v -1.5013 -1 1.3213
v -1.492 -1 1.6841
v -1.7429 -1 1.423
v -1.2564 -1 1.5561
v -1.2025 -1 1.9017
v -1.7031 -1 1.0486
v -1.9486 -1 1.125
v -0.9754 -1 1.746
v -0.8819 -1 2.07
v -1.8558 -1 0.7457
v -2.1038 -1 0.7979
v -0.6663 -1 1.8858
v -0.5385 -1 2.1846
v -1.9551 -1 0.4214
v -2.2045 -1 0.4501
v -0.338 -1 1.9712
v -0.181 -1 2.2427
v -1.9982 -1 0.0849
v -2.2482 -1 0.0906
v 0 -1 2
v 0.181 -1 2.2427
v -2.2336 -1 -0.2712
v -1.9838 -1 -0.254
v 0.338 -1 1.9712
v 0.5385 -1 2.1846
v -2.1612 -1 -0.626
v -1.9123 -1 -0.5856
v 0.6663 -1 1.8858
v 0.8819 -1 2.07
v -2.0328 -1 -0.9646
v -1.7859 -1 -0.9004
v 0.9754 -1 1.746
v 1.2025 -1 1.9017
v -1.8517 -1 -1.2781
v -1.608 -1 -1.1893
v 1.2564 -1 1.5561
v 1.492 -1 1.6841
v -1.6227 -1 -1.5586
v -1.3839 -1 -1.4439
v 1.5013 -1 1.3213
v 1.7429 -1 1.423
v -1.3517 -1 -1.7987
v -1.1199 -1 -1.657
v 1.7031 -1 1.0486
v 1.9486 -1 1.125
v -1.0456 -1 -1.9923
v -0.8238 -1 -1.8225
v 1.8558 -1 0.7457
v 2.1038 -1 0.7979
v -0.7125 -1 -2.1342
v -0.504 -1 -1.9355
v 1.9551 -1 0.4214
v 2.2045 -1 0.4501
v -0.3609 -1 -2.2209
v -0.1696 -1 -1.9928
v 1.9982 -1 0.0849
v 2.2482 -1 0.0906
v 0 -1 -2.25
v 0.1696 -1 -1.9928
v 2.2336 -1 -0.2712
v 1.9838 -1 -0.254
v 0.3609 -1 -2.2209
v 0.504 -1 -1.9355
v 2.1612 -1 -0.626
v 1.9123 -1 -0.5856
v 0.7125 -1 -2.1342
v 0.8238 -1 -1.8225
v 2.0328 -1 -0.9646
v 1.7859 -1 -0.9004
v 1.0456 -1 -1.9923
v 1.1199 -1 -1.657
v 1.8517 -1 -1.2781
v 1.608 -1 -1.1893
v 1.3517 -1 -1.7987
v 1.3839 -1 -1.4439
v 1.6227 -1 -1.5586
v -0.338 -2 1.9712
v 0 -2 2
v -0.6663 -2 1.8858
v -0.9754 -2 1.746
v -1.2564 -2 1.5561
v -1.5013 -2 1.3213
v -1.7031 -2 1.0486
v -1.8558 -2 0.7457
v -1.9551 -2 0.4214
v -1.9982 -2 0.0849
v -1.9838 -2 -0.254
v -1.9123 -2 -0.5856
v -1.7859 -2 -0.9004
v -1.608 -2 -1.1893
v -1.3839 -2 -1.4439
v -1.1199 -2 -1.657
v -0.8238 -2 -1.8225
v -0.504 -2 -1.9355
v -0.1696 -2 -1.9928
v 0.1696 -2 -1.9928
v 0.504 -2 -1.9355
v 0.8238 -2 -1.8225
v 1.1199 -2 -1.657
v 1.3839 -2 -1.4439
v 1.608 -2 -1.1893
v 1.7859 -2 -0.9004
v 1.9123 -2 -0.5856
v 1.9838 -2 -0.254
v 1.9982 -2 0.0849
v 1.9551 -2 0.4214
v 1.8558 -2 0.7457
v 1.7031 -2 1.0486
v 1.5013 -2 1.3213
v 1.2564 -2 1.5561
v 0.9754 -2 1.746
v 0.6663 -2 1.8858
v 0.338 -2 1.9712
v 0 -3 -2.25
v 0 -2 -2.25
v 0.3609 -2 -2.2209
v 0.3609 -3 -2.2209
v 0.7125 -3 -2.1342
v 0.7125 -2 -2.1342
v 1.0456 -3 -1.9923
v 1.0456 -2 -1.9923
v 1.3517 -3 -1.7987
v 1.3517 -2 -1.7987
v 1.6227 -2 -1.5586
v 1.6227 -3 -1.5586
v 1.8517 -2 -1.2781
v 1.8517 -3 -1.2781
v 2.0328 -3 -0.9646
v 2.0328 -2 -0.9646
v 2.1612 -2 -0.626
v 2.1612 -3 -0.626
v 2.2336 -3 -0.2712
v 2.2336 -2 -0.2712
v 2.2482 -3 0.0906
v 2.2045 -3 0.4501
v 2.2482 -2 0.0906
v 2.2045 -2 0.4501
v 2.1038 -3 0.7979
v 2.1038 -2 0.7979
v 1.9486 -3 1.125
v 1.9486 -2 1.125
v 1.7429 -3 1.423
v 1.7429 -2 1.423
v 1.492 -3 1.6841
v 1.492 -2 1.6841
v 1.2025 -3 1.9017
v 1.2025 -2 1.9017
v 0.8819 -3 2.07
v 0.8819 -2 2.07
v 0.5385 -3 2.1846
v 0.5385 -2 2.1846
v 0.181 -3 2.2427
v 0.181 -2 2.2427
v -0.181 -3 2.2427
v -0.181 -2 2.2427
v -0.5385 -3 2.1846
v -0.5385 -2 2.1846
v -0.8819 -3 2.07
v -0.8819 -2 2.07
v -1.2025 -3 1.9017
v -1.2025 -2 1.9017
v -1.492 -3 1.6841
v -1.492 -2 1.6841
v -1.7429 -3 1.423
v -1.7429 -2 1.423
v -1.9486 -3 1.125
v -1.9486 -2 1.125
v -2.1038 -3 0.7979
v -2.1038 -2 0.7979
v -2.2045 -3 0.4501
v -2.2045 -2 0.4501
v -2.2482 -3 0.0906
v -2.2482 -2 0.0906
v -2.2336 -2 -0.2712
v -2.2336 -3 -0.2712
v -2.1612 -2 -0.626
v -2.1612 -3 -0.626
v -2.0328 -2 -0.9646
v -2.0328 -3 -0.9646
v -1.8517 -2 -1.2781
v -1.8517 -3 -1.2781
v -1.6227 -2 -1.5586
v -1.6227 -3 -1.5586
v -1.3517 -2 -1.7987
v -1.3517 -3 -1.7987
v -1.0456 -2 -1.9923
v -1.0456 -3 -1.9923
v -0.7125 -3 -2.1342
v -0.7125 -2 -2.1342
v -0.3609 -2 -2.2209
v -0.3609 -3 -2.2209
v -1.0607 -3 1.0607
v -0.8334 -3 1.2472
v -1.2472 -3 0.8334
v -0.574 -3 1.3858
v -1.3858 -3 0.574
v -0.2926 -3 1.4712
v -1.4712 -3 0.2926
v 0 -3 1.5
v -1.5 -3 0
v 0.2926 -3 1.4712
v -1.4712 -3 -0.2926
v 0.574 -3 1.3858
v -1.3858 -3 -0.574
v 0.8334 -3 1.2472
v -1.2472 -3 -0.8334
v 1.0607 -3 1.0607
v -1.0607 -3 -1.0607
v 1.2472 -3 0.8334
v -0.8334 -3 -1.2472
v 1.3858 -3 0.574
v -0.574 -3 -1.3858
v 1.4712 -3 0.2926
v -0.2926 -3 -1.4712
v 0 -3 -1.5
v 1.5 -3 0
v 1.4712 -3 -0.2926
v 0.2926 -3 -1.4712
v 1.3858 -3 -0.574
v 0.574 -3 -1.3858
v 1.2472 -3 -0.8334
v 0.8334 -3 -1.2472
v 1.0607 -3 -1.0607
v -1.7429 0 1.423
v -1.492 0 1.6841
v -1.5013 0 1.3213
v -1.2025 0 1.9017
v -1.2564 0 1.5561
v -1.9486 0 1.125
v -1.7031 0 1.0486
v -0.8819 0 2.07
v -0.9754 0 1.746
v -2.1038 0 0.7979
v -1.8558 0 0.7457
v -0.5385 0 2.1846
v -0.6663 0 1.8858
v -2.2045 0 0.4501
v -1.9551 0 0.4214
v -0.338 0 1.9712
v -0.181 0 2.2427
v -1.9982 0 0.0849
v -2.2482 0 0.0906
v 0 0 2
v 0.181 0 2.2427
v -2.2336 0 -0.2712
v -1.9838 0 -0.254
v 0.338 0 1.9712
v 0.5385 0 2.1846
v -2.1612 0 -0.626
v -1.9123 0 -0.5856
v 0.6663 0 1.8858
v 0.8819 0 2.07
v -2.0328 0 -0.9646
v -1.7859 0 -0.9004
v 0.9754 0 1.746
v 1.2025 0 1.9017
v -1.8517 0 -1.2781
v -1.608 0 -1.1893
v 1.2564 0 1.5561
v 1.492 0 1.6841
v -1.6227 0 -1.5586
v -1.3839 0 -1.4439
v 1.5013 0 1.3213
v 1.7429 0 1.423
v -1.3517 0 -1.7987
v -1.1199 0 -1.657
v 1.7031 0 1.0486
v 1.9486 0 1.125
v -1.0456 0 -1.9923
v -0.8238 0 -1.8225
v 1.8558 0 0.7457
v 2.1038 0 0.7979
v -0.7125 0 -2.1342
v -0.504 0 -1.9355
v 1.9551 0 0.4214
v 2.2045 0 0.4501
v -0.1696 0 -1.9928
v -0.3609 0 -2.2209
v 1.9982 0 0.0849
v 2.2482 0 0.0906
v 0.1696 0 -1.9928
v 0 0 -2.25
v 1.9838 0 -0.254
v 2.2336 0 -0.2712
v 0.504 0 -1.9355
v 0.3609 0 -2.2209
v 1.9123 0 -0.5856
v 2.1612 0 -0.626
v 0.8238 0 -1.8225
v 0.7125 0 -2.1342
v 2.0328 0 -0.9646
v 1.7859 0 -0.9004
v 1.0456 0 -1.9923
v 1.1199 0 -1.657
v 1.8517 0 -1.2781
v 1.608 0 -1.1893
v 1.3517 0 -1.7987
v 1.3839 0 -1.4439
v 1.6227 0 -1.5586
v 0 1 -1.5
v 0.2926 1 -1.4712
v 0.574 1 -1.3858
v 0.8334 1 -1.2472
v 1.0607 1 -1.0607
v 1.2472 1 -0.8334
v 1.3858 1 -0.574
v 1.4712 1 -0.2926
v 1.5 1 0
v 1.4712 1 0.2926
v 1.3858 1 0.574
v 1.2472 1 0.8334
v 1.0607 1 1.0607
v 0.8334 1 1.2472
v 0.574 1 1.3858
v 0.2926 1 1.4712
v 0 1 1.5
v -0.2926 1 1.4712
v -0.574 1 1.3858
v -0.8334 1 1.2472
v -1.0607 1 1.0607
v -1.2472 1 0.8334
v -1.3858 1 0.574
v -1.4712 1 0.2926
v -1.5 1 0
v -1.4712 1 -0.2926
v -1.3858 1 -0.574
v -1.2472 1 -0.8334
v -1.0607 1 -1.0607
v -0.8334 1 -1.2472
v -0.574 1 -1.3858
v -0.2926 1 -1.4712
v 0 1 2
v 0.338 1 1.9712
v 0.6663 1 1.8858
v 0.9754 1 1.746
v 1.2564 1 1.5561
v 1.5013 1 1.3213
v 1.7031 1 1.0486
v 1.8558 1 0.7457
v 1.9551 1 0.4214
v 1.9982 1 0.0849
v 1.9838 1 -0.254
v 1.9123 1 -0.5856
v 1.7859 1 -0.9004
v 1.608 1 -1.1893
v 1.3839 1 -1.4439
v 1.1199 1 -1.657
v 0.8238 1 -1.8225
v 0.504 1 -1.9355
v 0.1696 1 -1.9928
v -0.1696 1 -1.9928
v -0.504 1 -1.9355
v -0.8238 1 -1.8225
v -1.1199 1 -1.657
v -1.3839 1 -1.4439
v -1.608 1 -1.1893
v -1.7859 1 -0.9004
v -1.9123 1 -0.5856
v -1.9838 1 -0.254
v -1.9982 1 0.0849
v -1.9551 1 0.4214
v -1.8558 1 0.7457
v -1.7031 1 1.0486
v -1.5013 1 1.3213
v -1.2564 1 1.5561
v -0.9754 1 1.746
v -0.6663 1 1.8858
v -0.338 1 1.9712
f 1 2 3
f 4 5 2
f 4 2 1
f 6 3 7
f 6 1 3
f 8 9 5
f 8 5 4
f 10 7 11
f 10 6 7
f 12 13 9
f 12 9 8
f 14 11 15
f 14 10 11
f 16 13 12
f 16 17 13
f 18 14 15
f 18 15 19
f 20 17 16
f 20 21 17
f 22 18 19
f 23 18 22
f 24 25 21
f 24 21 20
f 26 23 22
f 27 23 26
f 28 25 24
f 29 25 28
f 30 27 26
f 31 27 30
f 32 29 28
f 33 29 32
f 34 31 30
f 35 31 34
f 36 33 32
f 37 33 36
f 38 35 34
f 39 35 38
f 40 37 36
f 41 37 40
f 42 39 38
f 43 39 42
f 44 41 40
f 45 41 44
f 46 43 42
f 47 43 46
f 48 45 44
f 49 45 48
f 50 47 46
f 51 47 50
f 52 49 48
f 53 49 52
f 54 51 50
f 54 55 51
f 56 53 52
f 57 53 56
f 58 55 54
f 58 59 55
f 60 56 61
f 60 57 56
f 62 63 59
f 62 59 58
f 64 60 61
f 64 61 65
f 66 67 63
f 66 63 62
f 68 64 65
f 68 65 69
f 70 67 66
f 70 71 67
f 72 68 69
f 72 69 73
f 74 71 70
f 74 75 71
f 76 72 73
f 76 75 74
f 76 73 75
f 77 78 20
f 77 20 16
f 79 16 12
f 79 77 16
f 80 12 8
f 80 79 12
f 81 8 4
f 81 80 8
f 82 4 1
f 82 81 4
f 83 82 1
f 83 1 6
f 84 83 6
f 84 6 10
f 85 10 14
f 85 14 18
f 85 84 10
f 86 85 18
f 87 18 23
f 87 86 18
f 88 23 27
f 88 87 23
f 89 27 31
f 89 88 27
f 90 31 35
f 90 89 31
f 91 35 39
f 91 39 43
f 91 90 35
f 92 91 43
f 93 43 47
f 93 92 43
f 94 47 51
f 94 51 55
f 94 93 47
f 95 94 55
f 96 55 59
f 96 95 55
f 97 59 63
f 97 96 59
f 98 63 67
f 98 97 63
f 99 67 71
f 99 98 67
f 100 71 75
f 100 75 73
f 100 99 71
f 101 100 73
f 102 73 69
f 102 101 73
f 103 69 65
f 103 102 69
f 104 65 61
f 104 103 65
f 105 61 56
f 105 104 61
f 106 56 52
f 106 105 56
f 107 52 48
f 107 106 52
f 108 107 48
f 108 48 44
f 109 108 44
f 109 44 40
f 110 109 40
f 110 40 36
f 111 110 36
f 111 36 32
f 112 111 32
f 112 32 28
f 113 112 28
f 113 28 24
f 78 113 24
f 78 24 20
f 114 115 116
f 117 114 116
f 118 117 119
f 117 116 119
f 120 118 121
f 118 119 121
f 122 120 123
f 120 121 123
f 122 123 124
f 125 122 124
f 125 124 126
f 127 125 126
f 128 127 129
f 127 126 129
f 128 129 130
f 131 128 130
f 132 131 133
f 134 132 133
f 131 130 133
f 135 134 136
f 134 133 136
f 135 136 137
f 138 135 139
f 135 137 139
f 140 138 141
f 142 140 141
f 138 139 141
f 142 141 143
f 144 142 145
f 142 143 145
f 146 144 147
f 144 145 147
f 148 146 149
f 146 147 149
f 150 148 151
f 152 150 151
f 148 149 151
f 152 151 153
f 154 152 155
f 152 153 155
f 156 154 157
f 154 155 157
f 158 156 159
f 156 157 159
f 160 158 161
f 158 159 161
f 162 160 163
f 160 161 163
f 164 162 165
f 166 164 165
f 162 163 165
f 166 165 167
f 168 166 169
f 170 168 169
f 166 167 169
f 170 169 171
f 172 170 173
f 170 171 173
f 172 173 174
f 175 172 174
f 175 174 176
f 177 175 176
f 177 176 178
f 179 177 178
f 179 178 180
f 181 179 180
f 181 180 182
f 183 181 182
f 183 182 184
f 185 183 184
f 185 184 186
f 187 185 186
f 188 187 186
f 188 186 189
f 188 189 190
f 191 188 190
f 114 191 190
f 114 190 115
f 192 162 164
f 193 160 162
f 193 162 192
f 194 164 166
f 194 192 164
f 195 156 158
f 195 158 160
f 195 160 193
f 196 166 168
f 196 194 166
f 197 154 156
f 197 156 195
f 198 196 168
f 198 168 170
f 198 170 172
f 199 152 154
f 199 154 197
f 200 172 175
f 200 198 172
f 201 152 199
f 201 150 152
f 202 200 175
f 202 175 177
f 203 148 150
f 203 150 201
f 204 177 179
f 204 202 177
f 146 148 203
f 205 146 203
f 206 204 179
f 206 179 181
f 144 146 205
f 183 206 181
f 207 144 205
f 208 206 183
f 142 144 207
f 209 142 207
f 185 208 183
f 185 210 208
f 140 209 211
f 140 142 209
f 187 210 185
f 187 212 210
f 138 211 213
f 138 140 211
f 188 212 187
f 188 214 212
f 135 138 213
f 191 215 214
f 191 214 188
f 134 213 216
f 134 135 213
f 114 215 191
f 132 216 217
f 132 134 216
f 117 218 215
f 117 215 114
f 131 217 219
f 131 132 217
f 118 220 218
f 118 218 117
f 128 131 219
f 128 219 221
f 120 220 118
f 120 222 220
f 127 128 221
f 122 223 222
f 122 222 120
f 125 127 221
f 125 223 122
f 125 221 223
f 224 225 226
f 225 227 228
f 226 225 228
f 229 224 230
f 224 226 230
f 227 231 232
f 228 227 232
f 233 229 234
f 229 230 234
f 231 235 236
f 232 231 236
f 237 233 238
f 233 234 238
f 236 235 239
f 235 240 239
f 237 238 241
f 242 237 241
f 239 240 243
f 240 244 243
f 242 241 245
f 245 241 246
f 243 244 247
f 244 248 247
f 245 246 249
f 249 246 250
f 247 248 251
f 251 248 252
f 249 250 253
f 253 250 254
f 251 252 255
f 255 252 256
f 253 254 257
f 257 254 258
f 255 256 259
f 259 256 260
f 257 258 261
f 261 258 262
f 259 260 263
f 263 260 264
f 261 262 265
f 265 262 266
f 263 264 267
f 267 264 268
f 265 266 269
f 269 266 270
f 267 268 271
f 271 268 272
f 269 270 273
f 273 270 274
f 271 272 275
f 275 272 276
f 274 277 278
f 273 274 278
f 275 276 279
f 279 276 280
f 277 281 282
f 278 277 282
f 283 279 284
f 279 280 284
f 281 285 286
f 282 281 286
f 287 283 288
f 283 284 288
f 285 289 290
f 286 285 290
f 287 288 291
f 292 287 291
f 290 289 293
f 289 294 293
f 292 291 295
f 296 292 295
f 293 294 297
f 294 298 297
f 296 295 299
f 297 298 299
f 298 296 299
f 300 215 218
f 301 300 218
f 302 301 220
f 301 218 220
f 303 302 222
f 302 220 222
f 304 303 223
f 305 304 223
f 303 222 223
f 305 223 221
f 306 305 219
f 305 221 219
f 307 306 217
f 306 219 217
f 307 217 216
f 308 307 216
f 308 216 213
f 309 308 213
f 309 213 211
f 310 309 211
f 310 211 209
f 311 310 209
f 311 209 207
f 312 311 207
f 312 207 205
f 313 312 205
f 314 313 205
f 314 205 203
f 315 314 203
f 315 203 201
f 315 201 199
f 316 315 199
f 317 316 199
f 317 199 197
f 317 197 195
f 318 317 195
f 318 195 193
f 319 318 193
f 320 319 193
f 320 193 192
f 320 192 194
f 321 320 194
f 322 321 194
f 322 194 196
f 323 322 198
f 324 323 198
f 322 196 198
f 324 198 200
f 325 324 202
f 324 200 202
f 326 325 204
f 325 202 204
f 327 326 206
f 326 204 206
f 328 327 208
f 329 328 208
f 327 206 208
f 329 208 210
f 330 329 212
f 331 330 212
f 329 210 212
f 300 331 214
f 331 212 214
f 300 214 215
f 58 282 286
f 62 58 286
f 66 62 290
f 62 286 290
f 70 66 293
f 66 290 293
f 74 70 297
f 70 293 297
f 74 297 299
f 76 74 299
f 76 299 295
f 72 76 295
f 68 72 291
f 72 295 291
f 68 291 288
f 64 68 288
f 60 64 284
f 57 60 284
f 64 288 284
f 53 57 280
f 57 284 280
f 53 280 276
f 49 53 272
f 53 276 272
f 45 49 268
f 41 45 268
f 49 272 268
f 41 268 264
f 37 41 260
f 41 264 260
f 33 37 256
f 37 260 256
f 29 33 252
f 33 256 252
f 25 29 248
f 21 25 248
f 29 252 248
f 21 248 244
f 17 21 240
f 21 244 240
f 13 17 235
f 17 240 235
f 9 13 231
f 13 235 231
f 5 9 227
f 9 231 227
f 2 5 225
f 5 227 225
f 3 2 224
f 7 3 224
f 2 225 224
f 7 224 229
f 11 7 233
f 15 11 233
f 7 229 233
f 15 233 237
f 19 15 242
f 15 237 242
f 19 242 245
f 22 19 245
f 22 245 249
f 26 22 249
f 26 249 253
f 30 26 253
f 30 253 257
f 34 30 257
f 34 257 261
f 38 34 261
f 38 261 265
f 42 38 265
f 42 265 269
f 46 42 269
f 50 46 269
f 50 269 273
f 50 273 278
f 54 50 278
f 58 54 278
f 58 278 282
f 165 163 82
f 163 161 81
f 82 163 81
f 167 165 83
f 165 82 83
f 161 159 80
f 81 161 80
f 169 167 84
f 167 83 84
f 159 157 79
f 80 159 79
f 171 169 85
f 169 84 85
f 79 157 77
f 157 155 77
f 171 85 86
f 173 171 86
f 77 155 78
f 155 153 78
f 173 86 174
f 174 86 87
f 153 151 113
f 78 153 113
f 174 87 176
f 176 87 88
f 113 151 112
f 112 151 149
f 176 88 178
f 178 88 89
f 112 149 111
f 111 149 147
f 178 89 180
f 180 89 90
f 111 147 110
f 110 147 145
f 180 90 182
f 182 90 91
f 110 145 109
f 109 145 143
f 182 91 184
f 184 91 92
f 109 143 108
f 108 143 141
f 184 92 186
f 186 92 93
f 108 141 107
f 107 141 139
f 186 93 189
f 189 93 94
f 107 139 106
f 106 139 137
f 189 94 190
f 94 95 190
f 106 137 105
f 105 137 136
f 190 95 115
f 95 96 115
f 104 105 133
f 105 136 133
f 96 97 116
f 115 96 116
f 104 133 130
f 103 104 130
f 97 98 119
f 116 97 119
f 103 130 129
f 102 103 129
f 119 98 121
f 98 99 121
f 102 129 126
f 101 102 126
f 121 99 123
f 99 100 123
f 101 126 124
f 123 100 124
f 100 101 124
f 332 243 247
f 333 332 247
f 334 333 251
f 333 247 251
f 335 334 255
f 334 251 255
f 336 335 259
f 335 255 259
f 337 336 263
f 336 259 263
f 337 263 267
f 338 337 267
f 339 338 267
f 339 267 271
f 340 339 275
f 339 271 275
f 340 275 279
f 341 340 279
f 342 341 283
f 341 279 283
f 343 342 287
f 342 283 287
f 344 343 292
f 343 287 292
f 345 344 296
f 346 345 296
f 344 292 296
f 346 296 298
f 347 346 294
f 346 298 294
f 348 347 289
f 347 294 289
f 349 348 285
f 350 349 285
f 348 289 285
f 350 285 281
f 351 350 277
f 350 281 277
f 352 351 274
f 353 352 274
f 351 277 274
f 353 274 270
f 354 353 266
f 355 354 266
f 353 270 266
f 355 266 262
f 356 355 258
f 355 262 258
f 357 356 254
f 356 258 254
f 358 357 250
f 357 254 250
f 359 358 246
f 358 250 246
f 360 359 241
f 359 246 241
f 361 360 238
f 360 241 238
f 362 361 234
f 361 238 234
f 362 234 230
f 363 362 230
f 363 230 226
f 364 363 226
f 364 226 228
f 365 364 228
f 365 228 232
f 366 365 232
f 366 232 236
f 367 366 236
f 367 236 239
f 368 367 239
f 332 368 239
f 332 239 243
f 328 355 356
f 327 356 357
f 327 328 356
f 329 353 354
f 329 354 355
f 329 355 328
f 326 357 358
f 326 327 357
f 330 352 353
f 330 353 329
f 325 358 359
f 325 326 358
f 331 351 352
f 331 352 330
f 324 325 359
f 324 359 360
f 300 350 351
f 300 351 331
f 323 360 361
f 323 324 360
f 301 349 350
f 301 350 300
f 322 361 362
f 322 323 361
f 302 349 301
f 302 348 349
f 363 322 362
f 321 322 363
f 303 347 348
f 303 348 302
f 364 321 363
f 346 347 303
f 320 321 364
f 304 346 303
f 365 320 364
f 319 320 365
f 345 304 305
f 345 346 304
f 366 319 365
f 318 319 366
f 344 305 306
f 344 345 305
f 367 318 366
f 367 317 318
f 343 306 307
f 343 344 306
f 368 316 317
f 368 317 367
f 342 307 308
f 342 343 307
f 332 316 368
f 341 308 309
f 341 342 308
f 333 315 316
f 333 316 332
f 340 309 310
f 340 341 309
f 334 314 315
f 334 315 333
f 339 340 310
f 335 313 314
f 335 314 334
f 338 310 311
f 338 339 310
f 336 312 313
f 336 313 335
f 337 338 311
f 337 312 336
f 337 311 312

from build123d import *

# Parameters (mm, degrees)
SKETCH1_R           = 2
BOSS_EXTRUDE1_DEPTH = 1
SKETCH2_R           = 2.25
BOSS_EXTRUDE2_DEPTH = 1
BOSS_EXTRUDE3_START = 1
SKETCH3_R           = 2
BOSS_EXTRUDE3_DEPTH = 1
SKETCH4_R           = 2.25
BOSS_EXTRUDE4_DEPTH = 1
SKETCH5_R           = 1.5
CUT_EXTRUDE1_DEPTH  = 6.111262075


with BuildPart() as part:
    # Sketch1 → Boss-Extrude1 (new body)
    with BuildSketch(Plane(origin=(0, 0, 0), x_dir=(1, 0, 0), z_dir=(0, 1, 0))):
        with Locations(Location((0, 0, 0), (0, 0, 270))):
            Circle(SKETCH1_R)
    extrude(amount=BOSS_EXTRUDE1_DEPTH)

    # Sketch2 → Boss-Extrude2 (add)
    with BuildSketch(Plane.XZ):
        with Locations(Location((0, 0, 0), (0, 0, 270))):
            Circle(SKETCH2_R)
    extrude(amount=BOSS_EXTRUDE2_DEPTH)

    # Sketch3 → Boss-Extrude3 (add)
    with BuildSketch(Plane.XZ.offset(1).offset(BOSS_EXTRUDE3_START)):
        with Locations(Location((0, 0, 0), (0, 0, 90))):
            Circle(SKETCH3_R)
    extrude(amount=-BOSS_EXTRUDE3_DEPTH)

    # Sketch4 → Boss-Extrude4 (add)
    with BuildSketch(Plane.XZ.offset(2)):
        with Locations(Location((0, 0, 0), (0, 0, 270))):
            Circle(SKETCH4_R)
    extrude(amount=BOSS_EXTRUDE4_DEPTH)

    # Sketch5 → Cut-Extrude1 (cut, through all)
    with BuildSketch(Plane.XZ.offset(3)):
        with Locations(Location((0, 0, 0), (0, 0, 270))):
            Circle(SKETCH5_R)
    extrude(amount=-CUT_EXTRUDE1_DEPTH, mode=Mode.SUBTRACT)


solid = part.part
